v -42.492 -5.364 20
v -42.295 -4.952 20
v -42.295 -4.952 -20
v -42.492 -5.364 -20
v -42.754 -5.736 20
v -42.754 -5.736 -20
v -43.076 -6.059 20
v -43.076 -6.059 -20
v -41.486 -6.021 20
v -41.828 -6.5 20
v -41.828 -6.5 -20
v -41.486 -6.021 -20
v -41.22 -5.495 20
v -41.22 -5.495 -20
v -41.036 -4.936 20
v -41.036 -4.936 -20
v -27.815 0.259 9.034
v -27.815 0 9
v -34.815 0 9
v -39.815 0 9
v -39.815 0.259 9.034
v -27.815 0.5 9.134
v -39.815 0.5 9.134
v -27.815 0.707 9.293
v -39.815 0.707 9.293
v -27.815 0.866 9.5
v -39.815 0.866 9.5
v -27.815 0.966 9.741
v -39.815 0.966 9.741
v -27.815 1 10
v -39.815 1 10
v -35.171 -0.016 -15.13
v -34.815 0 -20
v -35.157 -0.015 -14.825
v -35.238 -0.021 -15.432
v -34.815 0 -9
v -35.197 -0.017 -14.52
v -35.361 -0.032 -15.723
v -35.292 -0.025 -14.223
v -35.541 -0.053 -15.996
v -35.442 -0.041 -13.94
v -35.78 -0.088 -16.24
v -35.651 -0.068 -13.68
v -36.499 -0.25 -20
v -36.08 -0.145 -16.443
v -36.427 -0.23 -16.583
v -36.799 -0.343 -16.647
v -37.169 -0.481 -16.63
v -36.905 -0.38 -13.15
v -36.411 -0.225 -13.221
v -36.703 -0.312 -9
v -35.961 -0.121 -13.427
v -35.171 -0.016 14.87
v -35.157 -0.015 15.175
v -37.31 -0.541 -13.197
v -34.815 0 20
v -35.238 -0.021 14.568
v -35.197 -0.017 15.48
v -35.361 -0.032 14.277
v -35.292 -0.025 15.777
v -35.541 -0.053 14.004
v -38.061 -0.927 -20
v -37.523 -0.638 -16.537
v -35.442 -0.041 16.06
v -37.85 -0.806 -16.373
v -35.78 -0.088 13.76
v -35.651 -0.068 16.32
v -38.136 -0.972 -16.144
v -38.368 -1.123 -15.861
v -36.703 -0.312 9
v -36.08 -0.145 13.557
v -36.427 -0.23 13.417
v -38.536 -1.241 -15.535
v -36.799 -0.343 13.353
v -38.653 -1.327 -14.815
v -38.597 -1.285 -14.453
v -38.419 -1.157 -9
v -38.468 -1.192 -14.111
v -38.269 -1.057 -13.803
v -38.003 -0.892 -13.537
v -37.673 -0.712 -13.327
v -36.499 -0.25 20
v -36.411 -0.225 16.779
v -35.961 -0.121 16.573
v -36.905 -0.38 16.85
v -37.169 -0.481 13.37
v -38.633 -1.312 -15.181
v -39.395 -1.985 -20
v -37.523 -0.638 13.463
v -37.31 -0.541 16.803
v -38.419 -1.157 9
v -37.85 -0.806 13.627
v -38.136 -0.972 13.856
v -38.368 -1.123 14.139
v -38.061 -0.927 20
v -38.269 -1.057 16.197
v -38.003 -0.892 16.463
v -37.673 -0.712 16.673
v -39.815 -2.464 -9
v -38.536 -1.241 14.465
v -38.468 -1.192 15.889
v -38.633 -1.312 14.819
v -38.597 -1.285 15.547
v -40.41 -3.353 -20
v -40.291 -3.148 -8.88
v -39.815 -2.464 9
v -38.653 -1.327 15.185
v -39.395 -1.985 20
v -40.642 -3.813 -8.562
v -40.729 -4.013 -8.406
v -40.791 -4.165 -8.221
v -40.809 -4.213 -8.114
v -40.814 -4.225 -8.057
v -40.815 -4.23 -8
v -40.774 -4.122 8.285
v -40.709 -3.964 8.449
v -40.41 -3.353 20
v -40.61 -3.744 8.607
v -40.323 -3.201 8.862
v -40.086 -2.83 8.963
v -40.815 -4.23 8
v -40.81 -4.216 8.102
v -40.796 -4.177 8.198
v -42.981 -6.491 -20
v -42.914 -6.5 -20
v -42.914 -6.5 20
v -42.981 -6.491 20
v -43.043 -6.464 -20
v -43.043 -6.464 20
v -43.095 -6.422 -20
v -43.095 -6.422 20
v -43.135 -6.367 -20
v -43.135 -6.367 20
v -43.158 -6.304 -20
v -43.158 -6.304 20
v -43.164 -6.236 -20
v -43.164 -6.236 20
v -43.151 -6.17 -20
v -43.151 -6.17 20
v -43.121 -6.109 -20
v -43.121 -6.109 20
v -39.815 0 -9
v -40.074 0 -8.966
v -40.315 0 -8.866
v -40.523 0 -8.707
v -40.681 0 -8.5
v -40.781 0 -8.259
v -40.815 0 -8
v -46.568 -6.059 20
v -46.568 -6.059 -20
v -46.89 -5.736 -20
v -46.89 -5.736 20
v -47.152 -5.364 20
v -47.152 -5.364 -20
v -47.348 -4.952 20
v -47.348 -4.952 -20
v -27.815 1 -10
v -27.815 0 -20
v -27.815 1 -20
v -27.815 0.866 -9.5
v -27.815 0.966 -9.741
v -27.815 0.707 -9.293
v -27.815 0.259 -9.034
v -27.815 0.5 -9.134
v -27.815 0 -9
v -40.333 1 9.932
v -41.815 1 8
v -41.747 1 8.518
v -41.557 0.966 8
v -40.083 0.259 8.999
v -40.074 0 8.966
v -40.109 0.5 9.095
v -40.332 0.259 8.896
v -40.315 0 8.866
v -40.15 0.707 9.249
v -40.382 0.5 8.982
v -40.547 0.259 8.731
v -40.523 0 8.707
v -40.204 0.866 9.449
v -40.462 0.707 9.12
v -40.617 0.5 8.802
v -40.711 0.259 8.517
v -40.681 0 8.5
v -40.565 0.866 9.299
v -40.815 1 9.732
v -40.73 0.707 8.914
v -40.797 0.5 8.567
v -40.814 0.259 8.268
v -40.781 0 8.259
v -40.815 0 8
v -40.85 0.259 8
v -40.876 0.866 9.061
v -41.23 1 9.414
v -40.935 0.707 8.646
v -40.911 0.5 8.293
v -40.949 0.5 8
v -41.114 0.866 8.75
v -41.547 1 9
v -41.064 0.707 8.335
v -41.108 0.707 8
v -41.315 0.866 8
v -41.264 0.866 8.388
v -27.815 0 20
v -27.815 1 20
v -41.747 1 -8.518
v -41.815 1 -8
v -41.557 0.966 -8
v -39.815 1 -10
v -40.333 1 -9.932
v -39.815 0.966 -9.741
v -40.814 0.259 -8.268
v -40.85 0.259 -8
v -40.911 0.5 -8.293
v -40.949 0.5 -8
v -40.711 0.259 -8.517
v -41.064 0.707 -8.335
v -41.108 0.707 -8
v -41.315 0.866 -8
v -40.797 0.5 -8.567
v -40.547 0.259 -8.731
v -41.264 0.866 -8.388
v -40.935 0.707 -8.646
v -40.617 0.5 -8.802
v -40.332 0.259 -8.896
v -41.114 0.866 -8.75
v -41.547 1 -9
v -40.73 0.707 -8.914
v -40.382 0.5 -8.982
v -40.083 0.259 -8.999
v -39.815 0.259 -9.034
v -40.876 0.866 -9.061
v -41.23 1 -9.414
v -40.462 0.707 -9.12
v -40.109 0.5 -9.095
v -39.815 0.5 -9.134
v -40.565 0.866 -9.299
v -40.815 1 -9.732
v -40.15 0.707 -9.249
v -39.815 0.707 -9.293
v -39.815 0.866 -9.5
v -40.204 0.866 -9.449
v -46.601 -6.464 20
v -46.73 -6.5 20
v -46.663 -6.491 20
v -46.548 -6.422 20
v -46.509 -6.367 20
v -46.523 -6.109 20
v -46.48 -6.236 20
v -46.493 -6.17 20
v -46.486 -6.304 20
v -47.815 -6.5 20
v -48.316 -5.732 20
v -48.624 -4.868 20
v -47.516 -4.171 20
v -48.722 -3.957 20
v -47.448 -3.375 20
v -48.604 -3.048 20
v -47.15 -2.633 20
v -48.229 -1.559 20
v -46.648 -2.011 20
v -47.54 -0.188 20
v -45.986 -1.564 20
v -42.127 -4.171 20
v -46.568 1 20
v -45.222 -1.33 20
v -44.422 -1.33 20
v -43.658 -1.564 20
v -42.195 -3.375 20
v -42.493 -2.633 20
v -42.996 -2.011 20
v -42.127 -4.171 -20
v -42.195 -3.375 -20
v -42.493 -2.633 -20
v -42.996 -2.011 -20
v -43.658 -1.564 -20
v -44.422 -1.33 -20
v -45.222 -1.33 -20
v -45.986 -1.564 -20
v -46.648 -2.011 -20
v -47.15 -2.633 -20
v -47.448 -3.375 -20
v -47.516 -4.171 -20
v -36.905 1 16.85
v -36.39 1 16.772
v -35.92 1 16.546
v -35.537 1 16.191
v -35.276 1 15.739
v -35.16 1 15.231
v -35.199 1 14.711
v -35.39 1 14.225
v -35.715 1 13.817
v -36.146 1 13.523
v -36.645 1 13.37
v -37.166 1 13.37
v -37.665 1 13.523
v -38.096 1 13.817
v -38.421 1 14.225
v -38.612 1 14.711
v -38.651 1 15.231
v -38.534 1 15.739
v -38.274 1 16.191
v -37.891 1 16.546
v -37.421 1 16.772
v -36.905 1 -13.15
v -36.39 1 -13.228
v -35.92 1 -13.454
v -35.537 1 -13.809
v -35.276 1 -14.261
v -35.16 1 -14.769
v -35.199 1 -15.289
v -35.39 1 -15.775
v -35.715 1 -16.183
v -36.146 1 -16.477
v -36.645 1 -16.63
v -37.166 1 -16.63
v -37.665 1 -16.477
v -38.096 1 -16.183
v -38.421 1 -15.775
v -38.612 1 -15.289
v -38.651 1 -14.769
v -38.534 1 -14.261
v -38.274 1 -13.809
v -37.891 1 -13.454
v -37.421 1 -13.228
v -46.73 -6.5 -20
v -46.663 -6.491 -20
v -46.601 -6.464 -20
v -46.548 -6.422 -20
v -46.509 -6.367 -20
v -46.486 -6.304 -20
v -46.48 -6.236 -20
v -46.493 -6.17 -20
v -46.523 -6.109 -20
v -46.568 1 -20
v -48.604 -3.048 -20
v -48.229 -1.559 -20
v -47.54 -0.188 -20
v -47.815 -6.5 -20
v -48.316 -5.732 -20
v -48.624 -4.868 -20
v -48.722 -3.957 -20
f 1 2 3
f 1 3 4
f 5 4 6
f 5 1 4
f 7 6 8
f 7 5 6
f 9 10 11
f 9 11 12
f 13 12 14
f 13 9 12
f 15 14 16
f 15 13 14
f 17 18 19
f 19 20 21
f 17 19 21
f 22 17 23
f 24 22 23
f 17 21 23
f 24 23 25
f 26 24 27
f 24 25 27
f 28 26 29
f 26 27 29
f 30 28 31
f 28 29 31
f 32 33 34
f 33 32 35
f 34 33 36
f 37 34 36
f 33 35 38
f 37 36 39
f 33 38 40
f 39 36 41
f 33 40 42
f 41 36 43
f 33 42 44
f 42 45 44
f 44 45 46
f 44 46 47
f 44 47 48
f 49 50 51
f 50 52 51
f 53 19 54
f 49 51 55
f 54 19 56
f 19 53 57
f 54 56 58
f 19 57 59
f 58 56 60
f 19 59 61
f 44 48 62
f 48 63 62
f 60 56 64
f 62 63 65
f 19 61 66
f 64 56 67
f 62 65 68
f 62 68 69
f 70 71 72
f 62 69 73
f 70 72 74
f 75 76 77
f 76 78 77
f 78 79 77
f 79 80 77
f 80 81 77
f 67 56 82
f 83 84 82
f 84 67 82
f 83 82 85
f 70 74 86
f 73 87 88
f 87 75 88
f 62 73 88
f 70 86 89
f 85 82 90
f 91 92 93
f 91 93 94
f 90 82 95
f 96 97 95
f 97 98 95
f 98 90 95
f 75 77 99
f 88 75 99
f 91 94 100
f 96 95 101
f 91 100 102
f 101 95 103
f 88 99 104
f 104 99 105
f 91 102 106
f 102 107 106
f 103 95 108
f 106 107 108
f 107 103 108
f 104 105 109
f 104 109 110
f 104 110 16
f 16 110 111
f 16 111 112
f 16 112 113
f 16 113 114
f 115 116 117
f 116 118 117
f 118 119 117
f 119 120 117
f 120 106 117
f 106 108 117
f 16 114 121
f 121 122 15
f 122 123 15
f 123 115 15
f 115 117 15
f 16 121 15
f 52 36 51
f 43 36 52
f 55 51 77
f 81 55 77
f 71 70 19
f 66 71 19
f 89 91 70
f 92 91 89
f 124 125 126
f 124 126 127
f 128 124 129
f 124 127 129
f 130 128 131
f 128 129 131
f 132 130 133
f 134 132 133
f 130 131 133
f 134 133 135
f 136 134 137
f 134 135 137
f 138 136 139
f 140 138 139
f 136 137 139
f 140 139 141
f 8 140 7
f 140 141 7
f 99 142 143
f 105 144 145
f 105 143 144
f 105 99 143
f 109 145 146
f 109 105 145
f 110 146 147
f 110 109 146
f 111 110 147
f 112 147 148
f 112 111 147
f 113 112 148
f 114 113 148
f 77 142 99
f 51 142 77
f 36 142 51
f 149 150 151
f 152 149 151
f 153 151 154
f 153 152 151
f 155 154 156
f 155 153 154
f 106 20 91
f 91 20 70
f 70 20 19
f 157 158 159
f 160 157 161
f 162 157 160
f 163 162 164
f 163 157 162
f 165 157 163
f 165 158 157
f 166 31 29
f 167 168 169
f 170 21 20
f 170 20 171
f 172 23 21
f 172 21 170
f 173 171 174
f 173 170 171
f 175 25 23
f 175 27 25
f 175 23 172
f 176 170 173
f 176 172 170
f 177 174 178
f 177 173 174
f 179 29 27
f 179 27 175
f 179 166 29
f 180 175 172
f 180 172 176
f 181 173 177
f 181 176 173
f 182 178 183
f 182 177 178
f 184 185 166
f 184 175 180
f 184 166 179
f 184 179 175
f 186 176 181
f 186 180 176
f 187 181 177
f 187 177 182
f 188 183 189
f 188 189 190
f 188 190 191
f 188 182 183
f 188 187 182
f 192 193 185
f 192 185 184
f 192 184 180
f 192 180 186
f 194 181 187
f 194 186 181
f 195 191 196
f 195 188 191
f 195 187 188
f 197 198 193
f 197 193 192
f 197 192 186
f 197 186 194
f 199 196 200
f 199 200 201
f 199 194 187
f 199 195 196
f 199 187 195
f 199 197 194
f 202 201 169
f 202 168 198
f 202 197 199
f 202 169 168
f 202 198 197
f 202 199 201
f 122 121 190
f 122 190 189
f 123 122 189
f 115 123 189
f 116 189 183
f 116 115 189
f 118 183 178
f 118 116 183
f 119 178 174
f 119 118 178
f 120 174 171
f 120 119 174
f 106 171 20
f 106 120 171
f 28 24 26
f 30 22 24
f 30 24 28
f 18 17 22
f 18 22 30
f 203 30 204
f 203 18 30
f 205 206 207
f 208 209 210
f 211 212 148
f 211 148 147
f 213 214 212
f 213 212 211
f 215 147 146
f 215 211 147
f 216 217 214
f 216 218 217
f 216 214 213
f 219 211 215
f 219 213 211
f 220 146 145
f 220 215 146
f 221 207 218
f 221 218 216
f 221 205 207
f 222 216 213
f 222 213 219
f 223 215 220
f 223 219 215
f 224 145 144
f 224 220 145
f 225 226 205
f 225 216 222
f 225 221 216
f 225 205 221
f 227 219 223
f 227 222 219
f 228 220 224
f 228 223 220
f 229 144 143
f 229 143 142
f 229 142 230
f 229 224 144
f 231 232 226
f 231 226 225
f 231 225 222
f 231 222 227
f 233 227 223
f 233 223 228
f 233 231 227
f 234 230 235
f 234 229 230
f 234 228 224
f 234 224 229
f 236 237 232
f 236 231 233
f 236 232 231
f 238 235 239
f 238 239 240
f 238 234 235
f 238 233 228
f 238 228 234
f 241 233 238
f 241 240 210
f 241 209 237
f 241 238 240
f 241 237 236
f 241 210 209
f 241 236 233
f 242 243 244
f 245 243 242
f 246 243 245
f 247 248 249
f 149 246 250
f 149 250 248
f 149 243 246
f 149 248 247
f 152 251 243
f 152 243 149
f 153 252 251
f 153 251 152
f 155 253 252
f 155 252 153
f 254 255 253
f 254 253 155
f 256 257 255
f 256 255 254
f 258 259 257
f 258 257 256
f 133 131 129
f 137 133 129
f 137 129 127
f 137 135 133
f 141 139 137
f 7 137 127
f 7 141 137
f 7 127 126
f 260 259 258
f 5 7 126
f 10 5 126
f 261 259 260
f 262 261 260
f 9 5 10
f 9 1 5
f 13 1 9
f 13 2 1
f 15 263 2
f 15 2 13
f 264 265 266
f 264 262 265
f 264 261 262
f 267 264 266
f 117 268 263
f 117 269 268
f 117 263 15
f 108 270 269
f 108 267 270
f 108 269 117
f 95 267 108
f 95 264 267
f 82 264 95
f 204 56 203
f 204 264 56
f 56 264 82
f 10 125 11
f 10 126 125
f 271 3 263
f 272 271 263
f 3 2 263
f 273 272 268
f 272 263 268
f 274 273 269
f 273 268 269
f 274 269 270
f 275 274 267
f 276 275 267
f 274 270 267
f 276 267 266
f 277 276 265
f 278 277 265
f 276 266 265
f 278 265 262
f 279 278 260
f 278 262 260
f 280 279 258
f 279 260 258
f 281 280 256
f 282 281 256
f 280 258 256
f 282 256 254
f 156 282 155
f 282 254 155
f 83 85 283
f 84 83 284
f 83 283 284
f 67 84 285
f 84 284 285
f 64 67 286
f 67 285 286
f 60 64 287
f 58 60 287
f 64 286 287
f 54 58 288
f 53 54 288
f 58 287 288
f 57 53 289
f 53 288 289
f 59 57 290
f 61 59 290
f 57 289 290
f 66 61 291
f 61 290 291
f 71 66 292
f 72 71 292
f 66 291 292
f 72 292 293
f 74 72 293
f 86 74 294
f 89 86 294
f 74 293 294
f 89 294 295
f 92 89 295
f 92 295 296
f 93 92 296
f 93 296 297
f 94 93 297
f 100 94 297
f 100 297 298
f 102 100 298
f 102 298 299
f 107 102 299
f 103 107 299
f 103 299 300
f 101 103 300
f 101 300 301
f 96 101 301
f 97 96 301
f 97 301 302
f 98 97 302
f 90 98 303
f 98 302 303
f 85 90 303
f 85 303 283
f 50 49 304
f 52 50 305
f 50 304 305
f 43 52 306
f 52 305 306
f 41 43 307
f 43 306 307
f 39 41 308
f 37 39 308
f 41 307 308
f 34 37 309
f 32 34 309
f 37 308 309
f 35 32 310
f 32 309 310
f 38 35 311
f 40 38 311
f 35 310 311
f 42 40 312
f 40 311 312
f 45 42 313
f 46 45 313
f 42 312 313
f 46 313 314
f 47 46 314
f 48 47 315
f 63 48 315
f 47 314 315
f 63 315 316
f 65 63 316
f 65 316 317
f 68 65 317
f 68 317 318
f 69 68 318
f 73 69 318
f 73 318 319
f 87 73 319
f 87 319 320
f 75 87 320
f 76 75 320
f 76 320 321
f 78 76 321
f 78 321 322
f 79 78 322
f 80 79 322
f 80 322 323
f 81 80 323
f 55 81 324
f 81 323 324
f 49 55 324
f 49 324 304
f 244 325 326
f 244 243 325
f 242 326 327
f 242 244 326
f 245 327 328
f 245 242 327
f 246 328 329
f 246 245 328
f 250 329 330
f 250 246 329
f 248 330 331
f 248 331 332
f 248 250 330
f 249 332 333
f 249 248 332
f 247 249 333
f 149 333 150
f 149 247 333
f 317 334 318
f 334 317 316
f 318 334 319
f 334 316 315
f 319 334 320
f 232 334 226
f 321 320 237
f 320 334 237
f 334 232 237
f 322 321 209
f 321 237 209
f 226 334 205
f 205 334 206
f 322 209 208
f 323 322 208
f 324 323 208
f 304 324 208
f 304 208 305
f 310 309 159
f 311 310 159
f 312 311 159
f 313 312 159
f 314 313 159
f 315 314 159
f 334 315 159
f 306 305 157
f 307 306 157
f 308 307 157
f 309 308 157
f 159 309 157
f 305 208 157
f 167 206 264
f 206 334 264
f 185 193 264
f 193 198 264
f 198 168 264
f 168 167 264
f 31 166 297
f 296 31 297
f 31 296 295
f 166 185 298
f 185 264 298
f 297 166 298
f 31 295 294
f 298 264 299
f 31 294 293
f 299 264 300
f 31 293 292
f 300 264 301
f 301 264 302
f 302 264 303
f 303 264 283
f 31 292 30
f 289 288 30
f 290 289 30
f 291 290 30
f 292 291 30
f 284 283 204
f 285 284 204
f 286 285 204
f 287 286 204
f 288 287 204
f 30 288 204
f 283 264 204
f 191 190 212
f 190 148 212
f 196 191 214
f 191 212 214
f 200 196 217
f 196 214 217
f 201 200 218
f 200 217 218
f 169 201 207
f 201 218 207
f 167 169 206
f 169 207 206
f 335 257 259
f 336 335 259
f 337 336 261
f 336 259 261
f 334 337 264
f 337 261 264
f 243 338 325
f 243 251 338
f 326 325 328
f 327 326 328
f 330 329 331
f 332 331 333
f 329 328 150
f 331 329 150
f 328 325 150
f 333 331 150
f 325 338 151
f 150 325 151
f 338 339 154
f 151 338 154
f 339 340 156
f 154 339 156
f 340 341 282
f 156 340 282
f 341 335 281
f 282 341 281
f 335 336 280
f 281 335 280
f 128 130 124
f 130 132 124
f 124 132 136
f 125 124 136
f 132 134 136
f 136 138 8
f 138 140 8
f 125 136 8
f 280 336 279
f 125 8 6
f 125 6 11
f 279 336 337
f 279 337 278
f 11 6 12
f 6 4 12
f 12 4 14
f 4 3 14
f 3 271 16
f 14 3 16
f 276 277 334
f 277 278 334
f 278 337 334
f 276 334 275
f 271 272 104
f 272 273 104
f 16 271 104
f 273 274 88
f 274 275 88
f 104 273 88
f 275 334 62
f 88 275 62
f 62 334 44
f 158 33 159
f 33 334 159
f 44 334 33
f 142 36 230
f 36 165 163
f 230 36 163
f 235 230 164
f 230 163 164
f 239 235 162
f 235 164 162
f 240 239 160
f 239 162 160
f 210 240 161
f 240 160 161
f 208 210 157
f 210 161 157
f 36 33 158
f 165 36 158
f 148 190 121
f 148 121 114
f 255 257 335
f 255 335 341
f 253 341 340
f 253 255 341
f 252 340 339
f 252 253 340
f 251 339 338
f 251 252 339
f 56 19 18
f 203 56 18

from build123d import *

# Parameters (mm, degrees)
EXTRUDE_1_DEPTH                            = 3.9
EXTRUDE_3_DEPTH                            = 20
EXTRUDE_5_DEPTH                            = 20
FILLET_1_R                                 = 0.25
FILLET_1_OF_MIRROR_2_R                     = 0.25
SKETCH_7_R                                 = 5.5
CUT_EXTRUDE_3_DEPTH                        = 69.146236458
MIRROR_3_AT_THE_SECOND_PLANE_COPY_1_SKET_R = 5.5
MIRROR_3_AT_THE_SECOND_PLANE_COPY_1_DEPTH  = 69.146236458
ESQUISSE1_W                                = 44.6
ESQUISSE1_H                                = 40
ENL_V_MAT_EXTRU_1_DEPTH                    = 1.54
ENL_V_MAT_EXTRU_2_DEPTH                    = 57.761068742
ESQUISSE3_W                                = 50
ESQUISSE3_H                                = 1.36
ENL_V_MAT_EXTRU_3_DEPTH                    = 64.372466761
ESQUISSE4_W                                = 27.815449133
ESQUISSE4_H                                = 40
ENL_V_MAT_EXTRU_4_DEPTH                    = 54.066651895
ESQUISSE5_R                                = 1.75
ENL_V_MAT_EXTRU_5_DEPTH                    = 54.198396436
ESQUISSE6_W                                = 13
ESQUISSE6_H                                = 18
ENL_V_MAT_EXTRU_6_DEPTH                    = 54.198396473
CONG_1_R                                   = 1
CONG_2_R                                   = 1


with BuildPart() as part:
    # Эскиз1 → Бобышка-Вытянуть1 (new body)
    with BuildSketch(Plane(origin=(0, 0, 0), x_dir=(1, 0, 0), z_dir=(0, 1, 0))):
        with BuildLine():
            ThreePointArc((-44.6, -23.2), (-43.428427125, -26.028427125), (-40.6, -27.2))
            Line((-40.6, -27.2), (40.6, -27.2))
            ThreePointArc((40.6, -27.2), (43.428427125, -26.028427125), (44.6, -23.2))
            Line((44.6, -23.2), (44.6, 23.2))
            ThreePointArc((44.6, 23.2), (43.428427125, 26.028427125), (40.6, 27.2))
            Line((40.6, 27.2), (33.6, 27.2))
            Line((33.6, 27.2), (-5.4, 27.2))
            Line((-5.4, 27.2), (-40.6, 27.2))
            ThreePointArc((-40.6, 27.2), (-43.428427125, 26.028427125), (-44.6, 23.2))
            Line((-44.6, 23.2), (-44.6, -23.2))
        make_face()
    extrude(amount=EXTRUDE_1_DEPTH)



with BuildPart() as body_2:
    # Эскиз3 → Бобышка-Вытянуть3 (new, symmetric)
    with BuildSketch(Plane.XY):
        with BuildLine():
            Line((-47.815262386, -6.499919999), (-45.841869662, -6.499919999))
            ThreePointArc((-45.841869662, -6.499919999), (-44.821869662, -1.3), (-43.801869662, -6.499919999))
            Line((-43.801869662, -6.499919999), (-41.828476938, -6.499919999))
            ThreePointArc((-41.828476938, -6.499919999), (-44.821869662, -0.1), (-47.815262386, -6.499919999))
        make_face()
    extrude_3 = extrude(amount=EXTRUDE_3_DEPTH, both=True)


with BuildPart() as part_1:
    add(part.part)

    add(body_2.part)  # Бобышка-Вытянуть5 merges body 2
    # Эскиз5 → Бобышка-Вытянуть5 (add, symmetric)
    with BuildSketch(Plane.XY):
        with BuildLine():
            ThreePointArc((-41.631827579, 2.999901942), (-46.932438451, 0.61464415), (-48.60377877, -4.952451312))
            Line((-48.60377877, -4.952451312), (-47.348297278, -4.952451312))
            ThreePointArc((-47.348297278, -4.952451312), (-44.821869662, -1.3), (-42.295442046, -4.952451312))
            Line((-42.295442046, -4.952451312), (-41.039960555, -4.952451312))
            ThreePointArc((-41.039960555, -4.952451312), (-38.684888017, -1.351535806), (-34.6, 0))
            Line((-34.6, 0), (-36.641600827, 0.870983001))
            ThreePointArc((-36.641600827, 0.870983001), (-38.922074934, 2.438561027), (-41.631827579, 2.999901942))
        make_face()
    extrude_5 = extrude(amount=EXTRUDE_5_DEPTH, both=True)

    # Скругление1
    fillet_1_edges = [part_1.edges().sort_by_distance(p)[0] for p in [
        (-43.801869662, -6.499919999, 0),
        (-45.841869662, -6.499919999, 0),
    ]]
    fillet(fillet_1_edges, radius=FILLET_1_R)

    # Зеркальное отражение1: Бобышка-Вытянуть5 across plane
    add(extrude_5.mirror(Plane(origin=(0, 0, 0), x_dir=(0, 0, 1), z_dir=(1, 0, 0))))

    # Зеркальное отражение2: Бобышка-Вытянуть3 across plane
    add(extrude_3.mirror(Plane(origin=(0, 0, 0), x_dir=(0, 0, 1), z_dir=(1, 0, 0))))

    # Скругление1 of Зеркальное отражение2
    fillet_1_of_mirror_2_edges = [part_1.edges().sort_by_distance(p)[0] for p in [
        (43.801869662, -6.499919999, 0),
        (45.841869662, -6.499919999, 0),
    ]]
    fillet(fillet_1_of_mirror_2_edges, radius=FILLET_1_OF_MIRROR_2_R)

    # Эскиз7 → Вырез-Вытянуть3 (cut, through all)
    with BuildSketch(Plane.XY.offset(20)):
        with Locations((-45, -4)):
            Circle(SKETCH_7_R)
    cut_extrude_3 = extrude(amount=CUT_EXTRUDE_3_DEPTH, mode=Mode.SUBTRACT)

    # Зеркальное отражение3: Вырез-Вытянуть3 across plane
    add(cut_extrude_3.mirror(Plane(origin=(0, 0, 0), x_dir=(0, 0, 1), z_dir=(1, 0, 0))), mode=Mode.SUBTRACT)

    # Зеркальное отражение3 at the second plane: Вырез-Вытянуть3 across plane
    add(cut_extrude_3.mirror(Plane.XY), mode=Mode.SUBTRACT)

    # Зеркальное отражение3 at the second plane copy 1 sket → Зеркальное отражение3 at the second plane copy 1 (cut, through all)
    with BuildSketch(Plane(origin=(0, 0, -20), x_dir=(-1, 0, 0), z_dir=(0, 0, -1))):
        with Locations((-45, -4)):
            Circle(MIRROR_3_AT_THE_SECOND_PLANE_COPY_1_SKET_R)
    extrude(amount=MIRROR_3_AT_THE_SECOND_PLANE_COPY_1_DEPTH, mode=Mode.SUBTRACT)

    # Esquisse1 → Enlèv. mat.-Extru.1 (cut)
    with BuildSketch(Plane(origin=(0, 3.9, 0), x_dir=(1, 0, 0), z_dir=(0, 1, 0))):
        with Locations((-22.3, 0)):
            Rectangle(ESQUISSE1_W, ESQUISSE1_H)
    extrude(amount=-ENL_V_MAT_EXTRU_1_DEPTH, mode=Mode.SUBTRACT)

    # Esquisse2 → Enlèv. mat.-Extru.2 (cut, through all)
    with BuildSketch(Plane(origin=(0, 3.9, 0), x_dir=(1, 0, 0), z_dir=(0, 1, 0))):
        Polygon((-44.6, 20), (-44.6, 27.2), (51.6, 27.2), (51.6, -27.2), (-44.6, -27.2), (-44.6, -20), (0, -20), (0, 20), align=None)
    extrude(amount=-ENL_V_MAT_EXTRU_2_DEPTH, mode=Mode.SUBTRACT)

    # Esquisse3 → Enlèv. mat.-Extru.3 (cut, through all)
    with BuildSketch(Plane.XY.offset(20)):
        with Locations((-25, 1.68)):
            Rectangle(ESQUISSE3_W, ESQUISSE3_H)
    extrude(amount=-ENL_V_MAT_EXTRU_3_DEPTH, mode=Mode.SUBTRACT)

    # Esquisse4 → Enlèv. mat.-Extru.4 (cut, through all)
    with BuildSketch(Plane.XZ):
        with Locations((-13.907724567, 0)):
            Rectangle(ESQUISSE4_W, ESQUISSE4_H)
    extrude(amount=-ENL_V_MAT_EXTRU_4_DEPTH, mode=Mode.SUBTRACT)

    # Esquisse5 → Enlèv. mat.-Extru.5 (cut, through all)
    with BuildSketch(Plane(origin=(0, 1, 0), x_dir=(1, 0, 0), z_dir=(0, 1, 0))):
        with Locations((-36.905449133, 14.9)):
            Circle(ESQUISSE5_R)
        with Locations((-36.905449133, -15.1)):
            Circle(ESQUISSE5_R)
    extrude(amount=-ENL_V_MAT_EXTRU_5_DEPTH, mode=Mode.SUBTRACT)

    # Esquisse6 → Enlèv. mat.-Extru.6 (cut, through all)
    with BuildSketch(Plane(origin=(0, 1, 0), x_dir=(1, 0, 0), z_dir=(0, 1, 0))):
        with Locations((-34.315449133, 0)):
            Rectangle(ESQUISSE6_W, ESQUISSE6_H)
    extrude(amount=-ENL_V_MAT_EXTRU_6_DEPTH, mode=Mode.SUBTRACT)

    # Congé1
    cong_1_edges = [part_1.edges().sort_by_distance(p)[0] for p in [
        (-40.815449133, -1.614859029, -9),
        (-40.815449133, -1.614859029, 9),
    ]]
    fillet(cong_1_edges, radius=CONG_1_R)

    # Congé2
    cong_2_edges = [part_1.edges().sort_by_distance(p)[0] for p in [
        (-33.815449133, 1, -9),
        (-40.522555914, 1, -8.707106781),
        (-33.815449133, 1, 9),
        (-40.522555914, 1, 8.707106781),
        (-40.815449133, 1, 0),
    ]]
    fillet(cong_2_edges, radius=CONG_2_R)


solid = part_1.part
